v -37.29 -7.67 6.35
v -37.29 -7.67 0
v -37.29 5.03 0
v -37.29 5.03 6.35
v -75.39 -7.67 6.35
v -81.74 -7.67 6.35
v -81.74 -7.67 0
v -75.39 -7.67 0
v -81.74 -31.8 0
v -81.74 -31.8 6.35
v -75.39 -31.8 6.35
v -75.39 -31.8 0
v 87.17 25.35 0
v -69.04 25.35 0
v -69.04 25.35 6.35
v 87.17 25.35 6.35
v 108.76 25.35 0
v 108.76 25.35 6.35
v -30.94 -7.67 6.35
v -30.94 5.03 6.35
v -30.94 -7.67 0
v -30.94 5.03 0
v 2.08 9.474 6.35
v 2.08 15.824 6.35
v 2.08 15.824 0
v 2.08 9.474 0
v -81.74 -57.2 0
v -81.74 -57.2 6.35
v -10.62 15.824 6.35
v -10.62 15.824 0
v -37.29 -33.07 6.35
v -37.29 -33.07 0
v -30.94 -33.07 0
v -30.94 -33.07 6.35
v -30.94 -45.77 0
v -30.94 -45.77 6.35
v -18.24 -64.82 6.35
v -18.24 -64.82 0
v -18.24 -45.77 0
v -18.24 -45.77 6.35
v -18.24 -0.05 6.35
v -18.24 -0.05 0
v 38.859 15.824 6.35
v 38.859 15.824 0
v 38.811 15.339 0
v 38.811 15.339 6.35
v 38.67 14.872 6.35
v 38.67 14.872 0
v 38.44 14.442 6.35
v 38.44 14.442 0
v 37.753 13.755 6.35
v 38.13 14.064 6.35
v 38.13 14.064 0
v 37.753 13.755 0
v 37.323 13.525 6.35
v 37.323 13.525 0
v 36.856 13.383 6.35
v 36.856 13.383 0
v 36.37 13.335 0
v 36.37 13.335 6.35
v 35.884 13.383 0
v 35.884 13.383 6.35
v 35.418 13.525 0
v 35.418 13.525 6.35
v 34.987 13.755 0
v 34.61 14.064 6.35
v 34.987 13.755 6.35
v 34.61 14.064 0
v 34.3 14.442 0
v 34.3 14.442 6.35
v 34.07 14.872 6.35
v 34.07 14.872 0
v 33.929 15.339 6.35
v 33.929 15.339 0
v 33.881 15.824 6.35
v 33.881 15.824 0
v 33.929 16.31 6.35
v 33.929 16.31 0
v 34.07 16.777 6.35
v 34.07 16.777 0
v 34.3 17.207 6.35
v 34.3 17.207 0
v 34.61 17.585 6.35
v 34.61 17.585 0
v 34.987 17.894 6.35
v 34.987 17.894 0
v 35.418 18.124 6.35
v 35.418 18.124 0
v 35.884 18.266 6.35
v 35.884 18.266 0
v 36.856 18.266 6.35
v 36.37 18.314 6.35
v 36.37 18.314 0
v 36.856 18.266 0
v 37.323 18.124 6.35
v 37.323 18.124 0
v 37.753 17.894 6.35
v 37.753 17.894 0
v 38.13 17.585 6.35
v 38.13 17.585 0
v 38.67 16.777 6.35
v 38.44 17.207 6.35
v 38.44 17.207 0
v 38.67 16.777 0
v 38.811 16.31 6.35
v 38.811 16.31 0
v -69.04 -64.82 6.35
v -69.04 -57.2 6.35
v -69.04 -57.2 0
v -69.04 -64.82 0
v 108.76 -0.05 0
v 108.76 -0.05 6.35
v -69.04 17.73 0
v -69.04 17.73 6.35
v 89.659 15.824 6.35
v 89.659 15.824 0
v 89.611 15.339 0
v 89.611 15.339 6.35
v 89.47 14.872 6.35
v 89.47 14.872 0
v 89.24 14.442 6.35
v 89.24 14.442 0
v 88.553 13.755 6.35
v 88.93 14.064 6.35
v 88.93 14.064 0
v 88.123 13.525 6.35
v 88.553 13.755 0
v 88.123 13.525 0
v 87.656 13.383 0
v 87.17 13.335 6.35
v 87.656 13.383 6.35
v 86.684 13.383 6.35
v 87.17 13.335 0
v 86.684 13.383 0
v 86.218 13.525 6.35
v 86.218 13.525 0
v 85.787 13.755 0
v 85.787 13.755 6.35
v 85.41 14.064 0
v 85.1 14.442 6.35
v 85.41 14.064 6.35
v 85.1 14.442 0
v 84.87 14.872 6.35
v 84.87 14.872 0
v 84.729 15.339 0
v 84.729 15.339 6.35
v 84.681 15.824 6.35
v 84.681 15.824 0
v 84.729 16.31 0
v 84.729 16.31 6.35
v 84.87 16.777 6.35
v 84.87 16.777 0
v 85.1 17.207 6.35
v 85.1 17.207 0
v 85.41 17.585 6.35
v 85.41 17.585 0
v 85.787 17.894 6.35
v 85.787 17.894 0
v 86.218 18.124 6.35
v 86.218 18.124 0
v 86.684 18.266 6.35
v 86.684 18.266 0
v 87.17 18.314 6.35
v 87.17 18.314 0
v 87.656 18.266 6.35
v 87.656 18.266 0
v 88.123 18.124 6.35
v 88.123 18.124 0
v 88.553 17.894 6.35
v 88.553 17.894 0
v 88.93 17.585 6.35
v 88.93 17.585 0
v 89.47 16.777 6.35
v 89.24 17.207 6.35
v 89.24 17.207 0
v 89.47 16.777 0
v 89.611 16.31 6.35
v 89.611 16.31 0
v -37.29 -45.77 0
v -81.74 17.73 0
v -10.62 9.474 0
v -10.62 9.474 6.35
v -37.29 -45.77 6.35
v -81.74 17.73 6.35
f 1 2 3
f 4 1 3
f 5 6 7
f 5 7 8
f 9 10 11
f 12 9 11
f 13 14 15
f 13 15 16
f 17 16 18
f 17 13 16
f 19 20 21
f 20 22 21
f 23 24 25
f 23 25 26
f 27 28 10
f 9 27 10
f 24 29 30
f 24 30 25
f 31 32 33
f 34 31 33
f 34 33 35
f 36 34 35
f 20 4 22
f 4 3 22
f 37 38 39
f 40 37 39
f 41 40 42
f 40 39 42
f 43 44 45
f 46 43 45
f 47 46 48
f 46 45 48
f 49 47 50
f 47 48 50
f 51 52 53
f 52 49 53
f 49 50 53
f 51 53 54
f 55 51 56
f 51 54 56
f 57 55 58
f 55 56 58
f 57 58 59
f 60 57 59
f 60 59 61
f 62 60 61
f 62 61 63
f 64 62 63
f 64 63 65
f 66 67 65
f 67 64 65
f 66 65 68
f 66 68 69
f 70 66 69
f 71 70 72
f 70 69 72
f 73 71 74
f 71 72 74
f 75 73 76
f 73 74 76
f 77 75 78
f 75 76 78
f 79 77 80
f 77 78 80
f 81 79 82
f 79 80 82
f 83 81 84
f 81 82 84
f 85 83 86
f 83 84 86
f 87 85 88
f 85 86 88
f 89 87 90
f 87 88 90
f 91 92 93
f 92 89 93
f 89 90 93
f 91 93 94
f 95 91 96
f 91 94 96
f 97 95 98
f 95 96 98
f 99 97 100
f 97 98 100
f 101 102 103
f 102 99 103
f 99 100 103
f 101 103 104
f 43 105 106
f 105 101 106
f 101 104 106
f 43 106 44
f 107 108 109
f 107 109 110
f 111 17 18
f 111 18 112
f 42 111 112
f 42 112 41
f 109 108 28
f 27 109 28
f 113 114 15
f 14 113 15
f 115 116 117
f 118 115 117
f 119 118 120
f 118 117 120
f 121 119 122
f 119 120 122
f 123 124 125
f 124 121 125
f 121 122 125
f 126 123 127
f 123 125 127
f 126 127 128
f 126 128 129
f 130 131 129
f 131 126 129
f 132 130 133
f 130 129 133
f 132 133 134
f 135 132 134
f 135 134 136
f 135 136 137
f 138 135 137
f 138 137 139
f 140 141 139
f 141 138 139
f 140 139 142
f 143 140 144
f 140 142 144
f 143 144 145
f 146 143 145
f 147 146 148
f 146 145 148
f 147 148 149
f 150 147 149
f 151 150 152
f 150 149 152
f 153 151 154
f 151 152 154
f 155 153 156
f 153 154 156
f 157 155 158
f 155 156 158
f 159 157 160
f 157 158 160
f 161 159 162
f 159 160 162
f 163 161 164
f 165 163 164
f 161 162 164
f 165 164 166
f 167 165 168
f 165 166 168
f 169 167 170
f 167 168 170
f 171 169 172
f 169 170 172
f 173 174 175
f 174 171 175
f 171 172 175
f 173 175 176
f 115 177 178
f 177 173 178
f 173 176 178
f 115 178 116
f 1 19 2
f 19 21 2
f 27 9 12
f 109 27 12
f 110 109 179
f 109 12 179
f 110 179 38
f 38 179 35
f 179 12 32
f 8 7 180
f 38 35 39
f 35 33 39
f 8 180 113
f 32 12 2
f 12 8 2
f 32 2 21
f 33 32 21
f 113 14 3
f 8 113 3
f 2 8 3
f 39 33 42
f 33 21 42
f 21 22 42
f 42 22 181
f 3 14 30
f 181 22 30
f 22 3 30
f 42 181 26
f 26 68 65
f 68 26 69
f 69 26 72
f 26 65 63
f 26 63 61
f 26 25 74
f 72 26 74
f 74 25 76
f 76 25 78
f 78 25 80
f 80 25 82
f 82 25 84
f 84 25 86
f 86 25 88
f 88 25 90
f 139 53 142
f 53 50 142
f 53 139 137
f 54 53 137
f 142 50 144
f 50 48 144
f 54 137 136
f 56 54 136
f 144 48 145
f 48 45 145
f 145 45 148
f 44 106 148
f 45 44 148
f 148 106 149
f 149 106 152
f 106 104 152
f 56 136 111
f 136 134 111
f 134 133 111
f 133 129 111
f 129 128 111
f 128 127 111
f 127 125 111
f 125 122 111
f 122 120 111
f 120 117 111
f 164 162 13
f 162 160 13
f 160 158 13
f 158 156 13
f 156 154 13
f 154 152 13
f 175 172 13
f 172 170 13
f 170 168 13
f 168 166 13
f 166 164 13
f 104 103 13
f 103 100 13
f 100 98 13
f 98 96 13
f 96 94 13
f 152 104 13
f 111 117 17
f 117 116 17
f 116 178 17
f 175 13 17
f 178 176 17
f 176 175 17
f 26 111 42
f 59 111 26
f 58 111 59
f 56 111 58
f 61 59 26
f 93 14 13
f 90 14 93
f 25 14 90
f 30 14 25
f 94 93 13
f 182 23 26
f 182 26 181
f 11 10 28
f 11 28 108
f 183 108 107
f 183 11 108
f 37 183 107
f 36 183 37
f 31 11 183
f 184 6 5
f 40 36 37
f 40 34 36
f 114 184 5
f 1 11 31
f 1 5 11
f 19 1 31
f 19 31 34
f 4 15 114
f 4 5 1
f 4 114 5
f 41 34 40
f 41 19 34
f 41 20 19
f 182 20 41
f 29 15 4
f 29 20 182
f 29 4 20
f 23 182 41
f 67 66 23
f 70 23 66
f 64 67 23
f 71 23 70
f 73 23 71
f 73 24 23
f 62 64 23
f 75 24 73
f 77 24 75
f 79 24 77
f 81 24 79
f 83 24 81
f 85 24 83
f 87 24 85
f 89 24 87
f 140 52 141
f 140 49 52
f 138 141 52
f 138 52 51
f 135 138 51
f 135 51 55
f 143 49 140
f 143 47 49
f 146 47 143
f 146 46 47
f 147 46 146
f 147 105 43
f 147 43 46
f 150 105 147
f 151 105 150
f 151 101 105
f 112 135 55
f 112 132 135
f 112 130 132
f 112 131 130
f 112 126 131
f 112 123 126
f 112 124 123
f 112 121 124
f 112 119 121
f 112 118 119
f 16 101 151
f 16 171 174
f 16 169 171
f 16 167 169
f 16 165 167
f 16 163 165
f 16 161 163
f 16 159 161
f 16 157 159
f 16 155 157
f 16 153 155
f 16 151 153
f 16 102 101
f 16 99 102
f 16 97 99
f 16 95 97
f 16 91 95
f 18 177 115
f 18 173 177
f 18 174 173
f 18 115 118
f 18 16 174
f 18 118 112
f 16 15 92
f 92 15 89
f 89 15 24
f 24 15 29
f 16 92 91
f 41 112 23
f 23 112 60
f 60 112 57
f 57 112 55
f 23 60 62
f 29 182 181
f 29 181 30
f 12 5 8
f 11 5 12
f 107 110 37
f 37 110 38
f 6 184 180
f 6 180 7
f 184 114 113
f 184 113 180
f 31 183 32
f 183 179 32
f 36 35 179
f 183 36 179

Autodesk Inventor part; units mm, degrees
ref_plane "YZ Plane" through (0, 0, 0) normal (1, 0, 0) x (0, 1, 0)
ref_plane "XZ Plane" through (0, 0, 0) normal (0, 1, 0) x (-1, 0, 0)
ref_plane "XY Plane" through (0, 0, 0) normal (0, 0, 1) x (1, 0, 0)
sketch "Sketch2" plane through (0, 0, 0) normal (0, 0, 1) x (1, 0, 0)
  line L0 (-75.3899, 25.3495) -> (108.7601, 25.3495)
  line L1 (108.7601, 25.3495) -> (108.7601, -0.0505)
  line L2 (108.7601, -0.0505) -> (-18.2399, -0.0505)
  line L3 (-75.3899, 25.3495) -> (-75.3899, -64.8205)
  line L4 (-75.3899, -64.8205) -> (-18.2399, -64.8205)
  line L5 (-18.2399, -64.8205) -> (-18.2399, -0.0505)
  line L6 (-75.3899, 25.3495) -> (-81.7399, 25.3495)
  line L7 (-81.7399, 25.3495) -> (-81.7399, -0.0505)
  line L8 (-81.7399, -0.0505) -> (-75.3899, -0.0505)
  line L9 (-75.3899, -64.8205) -> (-81.7399, -64.8205)
  line L10 (-81.7399, -64.8205) -> (-81.7399, -39.4205)
  line L11 (-81.7399, -39.4205) -> (-75.3899, -39.4205)
  line L12 (108.7601, 25.3495) -> (87.1701, 25.3495)
  line L13 (87.1701, 25.3495) -> (87.1701, 15.8245)
  line L14 (87.1701, 15.8245) -> (36.3701, 15.8245)
  circle A0 centre (36.3701, 15.8245) radius 2.4892
  circle A1 centre (87.1701, 15.8245) radius 2.4892
  line L15 (-18.2399, -64.8205) -> (-18.2399, -45.7705)
  line L16 (-18.2399, -45.7705) -> (-37.2899, -45.7705)
  line L17 (-37.2899, -45.7705) -> (-37.2899, -33.0705)
  line L18 (-37.2899, -33.0705) -> (-30.9399, -33.0705)
  line L19 (-30.9399, -33.0705) -> (-30.9399, -7.6705)
  line L20 (-30.9399, -7.6705) -> (-37.2899, -7.6705)
  line L21 (-37.2899, -7.6705) -> (-37.2899, 5.0295)
  line L22 (-37.2899, 5.0295) -> (-30.9399, 5.0295)
  line L23 (-30.9399, 5.0295) -> (-30.9399, -7.6705)
  line L24 (-30.9399, -33.0705) -> (-30.9399, -45.7705)
  point P0 (0, 0)
  dimension "d5" = 184.15
  dimension "d6" = 25.4
  dimension "d7" = 127
  dimension "d8" = 90.17
  dimension "d9" = 6.35
  dimension "d10" = 25.4
  dimension "d11" = 25.4
  dimension "d12" = 21.59
  dimension "d13" = 9.525
  dimension "d14" = 50.8
  dimension "d15" = 4.9784
  dimension "d16" = 4.9784
  dimension "d17" = 19.05
  dimension "d18" = 19.05
  dimension "d19" = 12.7
  dimension "d20" = 6.35
  dimension "d21" = 25.4
  dimension "d22" = 6.35
  dimension "d23" = 12.7
extrude "Extrusion1" add sketch "Sketch2" along normal blind 6.35
sketch "Sketch3" plane through (0, 0, 6.35) normal (0, 0, 1) x (1, 0, 0)
  line L0 (-81.7399, 25.3495) -> (108.7601, 25.3495) projected
  line L1 (-81.7399, -0.0505) -> (-81.7399, 25.3495) projected
  line L2 (-75.3899, -0.0505) -> (-81.7399, -0.0505) projected
  line L3 (-81.7399, -39.4205) -> (-75.3899, -39.4205) projected
  line L4 (-81.7399, -64.8205) -> (-81.7399, -39.4205) projected
  line L5 (-18.2399, -64.8205) -> (-81.7399, -64.8205) projected
  line L6 (-75.3899, -0.0505) -> (-75.3899, 12.6495)
  line L7 (-75.3899, 12.6495) -> (-69.0399, 12.6495)
  line L8 (-69.0399, 12.6495) -> (-69.0399, 25.3495)
  line L9 (-75.3899, -39.4205) -> (-75.3899, -52.1205)
  line L10 (-75.3899, -52.1205) -> (-69.0399, -52.1205)
  line L11 (-69.0399, -52.1205) -> (-69.0399, -64.8205)
  point P0 (0, 0)
  dimension "d26" = 12.7
  dimension "d27" = 6.35
  dimension "d28" = 12.7
  dimension "d29" = 6.35
extrude "Extrusion2" cut sketch "Sketch3" against normal blind 25.4
sketch "Sketch4" plane through (0, 0, 6.35) normal (0, 0, 1) x (1, 0, 0)
  line L0 (-75.3899, 12.6495) -> (-75.3899, -52.1205) projected
  line L1 (-75.3899, -52.1205) -> (-69.0399, -52.1205) projected
  line L2 (-69.0399, -52.1205) -> (-69.0399, -64.8205) projected
  line L3 (-69.0399, 25.3495) -> (-69.0399, 12.6495) projected
  line L4 (-69.0399, 12.6495) -> (-75.3899, 12.6495) projected
  line L5 (-69.0399, 25.3495) -> (-69.0399, 17.7295)
  line L6 (-69.0399, 17.7295) -> (-81.7399, 17.7295)
  line L7 (-81.7399, 17.7295) -> (-81.7399, -7.6705)
  line L8 (-81.7399, -7.6705) -> (-75.3899, -7.6705)
  line L9 (-69.0399, -64.8205) -> (-69.0399, -57.2005)
  line L10 (-69.0399, -57.2005) -> (-81.7399, -57.2005)
  line L11 (-81.7399, -57.2005) -> (-81.7399, -31.8005)
  line L12 (-81.7399, -31.8005) -> (-75.3899, -31.8005)
  point P0 (0, 0)
  dimension "d32" = 7.62
  dimension "d33" = 12.7
  dimension "d34" = 25.4
  dimension "d35" = 7.62
  dimension "d36" = 12.7
  dimension "d37" = 25.4
extrude "Extrusion3" add sketch "Sketch4" against normal blind 25.4
sketch "Sketch5" plane through (0, 0, 6.35) normal (0, 0, 1) x (1, 0, 0)
  line L0 (-81.7399, -57.2005) -> (-69.0399, -57.2005) projected
  line L1 (-69.0399, 17.7295) -> (-81.7399, 17.7295) projected
  line L2 (-30.9399, -33.0705) -> (-30.9399, -45.7705) projected
  line L3 (-69.0399, 17.7295) -> (-69.0399, 15.1895)
  line L4 (-69.0399, 15.1895) -> (-75.3899, 15.1895)
  line L5 (-75.3899, 15.1895) -> (-75.3899, 17.7295)
  line L6 (-69.0399, -57.2005) -> (-69.0399, -54.6605)
  line L7 (-69.0399, -54.6605) -> (-75.3899, -54.6605)
  line L8 (-75.3899, -54.6605) -> (-75.3899, -57.2005)
  point P0 (0, 0)
  dimension "d40" = 2.54
  dimension "d41" = 2.54
extrude "Extrusion4" cut sketch "Sketch5" against normal blind 25.4
sketch "Sketch6" plane through (-81.7399, -7.6705, 6.35) normal (-1, 0, 0) x (0, 0, 1)
  line L0 (0, 25.4) -> (-25.4, 25.4) projected
  line L1 (0, 25.4) -> (-6.35, 25.4)
  line L2 (-6.35, 25.4) -> (-6.35, -76.2)
  line L3 (-6.35, -76.2) -> (-39.1891, -38.2837)
  line L4 (-39.1891, -38.2837) -> (-39.1891, 49.1671)
  line L5 (-39.1891, 49.1671) -> (-6.35, 49.1671)
  line L6 (-6.35, 49.1671) -> (-6.35, 25.4)
  point P0 (-6.35, 7.6705)
  dimension "d44" = 101.6
extrude "Extrusion5" cut sketch "Sketch6" against normal blind 25.4
sketch "Sketch7" plane through (0, 0, 6.35) normal (0, 0, 1) x (1, 0, 0)
  line L0 (-75.3899, 15.1895) -> (-75.3899, 17.7295) projected
  line L1 (-75.3899, -57.2005) -> (-75.3899, -54.6605) projected
  line L2 (-75.3899, -54.6605) -> (-69.0399, -54.6605) projected
  line L3 (-69.0399, -54.6605) -> (-69.0399, -64.8205) projected
  line L4 (-69.0399, 25.3495) -> (-69.0399, 15.1895) projected
  line L5 (-69.0399, 15.1895) -> (-75.3899, 15.1895) projected
  line L6 (-75.3899, 17.7295) -> (-69.0399, 17.7295)
  line L7 (-75.3899, -57.2005) -> (-69.0399, -57.2005)
  point P0 (0, 0)
extrude "Extrusion6" add sketch "Sketch7" against normal blind 6.35
sketch "Sketch8" plane through (0, 0, 6.35) normal (0, 0, 1) x (1, 0, 0)
  line L0 (108.7601, -0.0505) -> (-18.2399, -0.0505) projected
  line L1 (-69.0399, 25.3495) -> (108.7601, 25.3495) projected
  line L2 (108.7601, 25.3495) -> (14.7801, 25.3495)
  line L3 (14.7801, 25.3495) -> (14.7801, 9.4745)
  line L4 (14.7801, 9.4745) -> (14.7801, 15.8245)
  line L5 (14.7801, 15.8245) -> (2.0801, 15.8245)
  line L6 (2.0801, 15.8245) -> (2.0801, 9.4745)
  line L7 (2.0801, 9.4745) -> (-10.6199, 9.4745)
  line L8 (-10.6199, 9.4745) -> (-10.6199, 15.8245)
  line L9 (-10.6199, 15.8245) -> (2.0801, 15.8245)
  point P0 (0, 0)
  dimension "d49" = 93.98
  dimension "d50" = 15.875
  dimension "d51" = 6.35
  dimension "d52" = 12.7
  dimension "d53" = 12.7
extrude "Extrusion7" cut sketch "Sketch8" against normal blind 25.4
properties part number "side 2"
